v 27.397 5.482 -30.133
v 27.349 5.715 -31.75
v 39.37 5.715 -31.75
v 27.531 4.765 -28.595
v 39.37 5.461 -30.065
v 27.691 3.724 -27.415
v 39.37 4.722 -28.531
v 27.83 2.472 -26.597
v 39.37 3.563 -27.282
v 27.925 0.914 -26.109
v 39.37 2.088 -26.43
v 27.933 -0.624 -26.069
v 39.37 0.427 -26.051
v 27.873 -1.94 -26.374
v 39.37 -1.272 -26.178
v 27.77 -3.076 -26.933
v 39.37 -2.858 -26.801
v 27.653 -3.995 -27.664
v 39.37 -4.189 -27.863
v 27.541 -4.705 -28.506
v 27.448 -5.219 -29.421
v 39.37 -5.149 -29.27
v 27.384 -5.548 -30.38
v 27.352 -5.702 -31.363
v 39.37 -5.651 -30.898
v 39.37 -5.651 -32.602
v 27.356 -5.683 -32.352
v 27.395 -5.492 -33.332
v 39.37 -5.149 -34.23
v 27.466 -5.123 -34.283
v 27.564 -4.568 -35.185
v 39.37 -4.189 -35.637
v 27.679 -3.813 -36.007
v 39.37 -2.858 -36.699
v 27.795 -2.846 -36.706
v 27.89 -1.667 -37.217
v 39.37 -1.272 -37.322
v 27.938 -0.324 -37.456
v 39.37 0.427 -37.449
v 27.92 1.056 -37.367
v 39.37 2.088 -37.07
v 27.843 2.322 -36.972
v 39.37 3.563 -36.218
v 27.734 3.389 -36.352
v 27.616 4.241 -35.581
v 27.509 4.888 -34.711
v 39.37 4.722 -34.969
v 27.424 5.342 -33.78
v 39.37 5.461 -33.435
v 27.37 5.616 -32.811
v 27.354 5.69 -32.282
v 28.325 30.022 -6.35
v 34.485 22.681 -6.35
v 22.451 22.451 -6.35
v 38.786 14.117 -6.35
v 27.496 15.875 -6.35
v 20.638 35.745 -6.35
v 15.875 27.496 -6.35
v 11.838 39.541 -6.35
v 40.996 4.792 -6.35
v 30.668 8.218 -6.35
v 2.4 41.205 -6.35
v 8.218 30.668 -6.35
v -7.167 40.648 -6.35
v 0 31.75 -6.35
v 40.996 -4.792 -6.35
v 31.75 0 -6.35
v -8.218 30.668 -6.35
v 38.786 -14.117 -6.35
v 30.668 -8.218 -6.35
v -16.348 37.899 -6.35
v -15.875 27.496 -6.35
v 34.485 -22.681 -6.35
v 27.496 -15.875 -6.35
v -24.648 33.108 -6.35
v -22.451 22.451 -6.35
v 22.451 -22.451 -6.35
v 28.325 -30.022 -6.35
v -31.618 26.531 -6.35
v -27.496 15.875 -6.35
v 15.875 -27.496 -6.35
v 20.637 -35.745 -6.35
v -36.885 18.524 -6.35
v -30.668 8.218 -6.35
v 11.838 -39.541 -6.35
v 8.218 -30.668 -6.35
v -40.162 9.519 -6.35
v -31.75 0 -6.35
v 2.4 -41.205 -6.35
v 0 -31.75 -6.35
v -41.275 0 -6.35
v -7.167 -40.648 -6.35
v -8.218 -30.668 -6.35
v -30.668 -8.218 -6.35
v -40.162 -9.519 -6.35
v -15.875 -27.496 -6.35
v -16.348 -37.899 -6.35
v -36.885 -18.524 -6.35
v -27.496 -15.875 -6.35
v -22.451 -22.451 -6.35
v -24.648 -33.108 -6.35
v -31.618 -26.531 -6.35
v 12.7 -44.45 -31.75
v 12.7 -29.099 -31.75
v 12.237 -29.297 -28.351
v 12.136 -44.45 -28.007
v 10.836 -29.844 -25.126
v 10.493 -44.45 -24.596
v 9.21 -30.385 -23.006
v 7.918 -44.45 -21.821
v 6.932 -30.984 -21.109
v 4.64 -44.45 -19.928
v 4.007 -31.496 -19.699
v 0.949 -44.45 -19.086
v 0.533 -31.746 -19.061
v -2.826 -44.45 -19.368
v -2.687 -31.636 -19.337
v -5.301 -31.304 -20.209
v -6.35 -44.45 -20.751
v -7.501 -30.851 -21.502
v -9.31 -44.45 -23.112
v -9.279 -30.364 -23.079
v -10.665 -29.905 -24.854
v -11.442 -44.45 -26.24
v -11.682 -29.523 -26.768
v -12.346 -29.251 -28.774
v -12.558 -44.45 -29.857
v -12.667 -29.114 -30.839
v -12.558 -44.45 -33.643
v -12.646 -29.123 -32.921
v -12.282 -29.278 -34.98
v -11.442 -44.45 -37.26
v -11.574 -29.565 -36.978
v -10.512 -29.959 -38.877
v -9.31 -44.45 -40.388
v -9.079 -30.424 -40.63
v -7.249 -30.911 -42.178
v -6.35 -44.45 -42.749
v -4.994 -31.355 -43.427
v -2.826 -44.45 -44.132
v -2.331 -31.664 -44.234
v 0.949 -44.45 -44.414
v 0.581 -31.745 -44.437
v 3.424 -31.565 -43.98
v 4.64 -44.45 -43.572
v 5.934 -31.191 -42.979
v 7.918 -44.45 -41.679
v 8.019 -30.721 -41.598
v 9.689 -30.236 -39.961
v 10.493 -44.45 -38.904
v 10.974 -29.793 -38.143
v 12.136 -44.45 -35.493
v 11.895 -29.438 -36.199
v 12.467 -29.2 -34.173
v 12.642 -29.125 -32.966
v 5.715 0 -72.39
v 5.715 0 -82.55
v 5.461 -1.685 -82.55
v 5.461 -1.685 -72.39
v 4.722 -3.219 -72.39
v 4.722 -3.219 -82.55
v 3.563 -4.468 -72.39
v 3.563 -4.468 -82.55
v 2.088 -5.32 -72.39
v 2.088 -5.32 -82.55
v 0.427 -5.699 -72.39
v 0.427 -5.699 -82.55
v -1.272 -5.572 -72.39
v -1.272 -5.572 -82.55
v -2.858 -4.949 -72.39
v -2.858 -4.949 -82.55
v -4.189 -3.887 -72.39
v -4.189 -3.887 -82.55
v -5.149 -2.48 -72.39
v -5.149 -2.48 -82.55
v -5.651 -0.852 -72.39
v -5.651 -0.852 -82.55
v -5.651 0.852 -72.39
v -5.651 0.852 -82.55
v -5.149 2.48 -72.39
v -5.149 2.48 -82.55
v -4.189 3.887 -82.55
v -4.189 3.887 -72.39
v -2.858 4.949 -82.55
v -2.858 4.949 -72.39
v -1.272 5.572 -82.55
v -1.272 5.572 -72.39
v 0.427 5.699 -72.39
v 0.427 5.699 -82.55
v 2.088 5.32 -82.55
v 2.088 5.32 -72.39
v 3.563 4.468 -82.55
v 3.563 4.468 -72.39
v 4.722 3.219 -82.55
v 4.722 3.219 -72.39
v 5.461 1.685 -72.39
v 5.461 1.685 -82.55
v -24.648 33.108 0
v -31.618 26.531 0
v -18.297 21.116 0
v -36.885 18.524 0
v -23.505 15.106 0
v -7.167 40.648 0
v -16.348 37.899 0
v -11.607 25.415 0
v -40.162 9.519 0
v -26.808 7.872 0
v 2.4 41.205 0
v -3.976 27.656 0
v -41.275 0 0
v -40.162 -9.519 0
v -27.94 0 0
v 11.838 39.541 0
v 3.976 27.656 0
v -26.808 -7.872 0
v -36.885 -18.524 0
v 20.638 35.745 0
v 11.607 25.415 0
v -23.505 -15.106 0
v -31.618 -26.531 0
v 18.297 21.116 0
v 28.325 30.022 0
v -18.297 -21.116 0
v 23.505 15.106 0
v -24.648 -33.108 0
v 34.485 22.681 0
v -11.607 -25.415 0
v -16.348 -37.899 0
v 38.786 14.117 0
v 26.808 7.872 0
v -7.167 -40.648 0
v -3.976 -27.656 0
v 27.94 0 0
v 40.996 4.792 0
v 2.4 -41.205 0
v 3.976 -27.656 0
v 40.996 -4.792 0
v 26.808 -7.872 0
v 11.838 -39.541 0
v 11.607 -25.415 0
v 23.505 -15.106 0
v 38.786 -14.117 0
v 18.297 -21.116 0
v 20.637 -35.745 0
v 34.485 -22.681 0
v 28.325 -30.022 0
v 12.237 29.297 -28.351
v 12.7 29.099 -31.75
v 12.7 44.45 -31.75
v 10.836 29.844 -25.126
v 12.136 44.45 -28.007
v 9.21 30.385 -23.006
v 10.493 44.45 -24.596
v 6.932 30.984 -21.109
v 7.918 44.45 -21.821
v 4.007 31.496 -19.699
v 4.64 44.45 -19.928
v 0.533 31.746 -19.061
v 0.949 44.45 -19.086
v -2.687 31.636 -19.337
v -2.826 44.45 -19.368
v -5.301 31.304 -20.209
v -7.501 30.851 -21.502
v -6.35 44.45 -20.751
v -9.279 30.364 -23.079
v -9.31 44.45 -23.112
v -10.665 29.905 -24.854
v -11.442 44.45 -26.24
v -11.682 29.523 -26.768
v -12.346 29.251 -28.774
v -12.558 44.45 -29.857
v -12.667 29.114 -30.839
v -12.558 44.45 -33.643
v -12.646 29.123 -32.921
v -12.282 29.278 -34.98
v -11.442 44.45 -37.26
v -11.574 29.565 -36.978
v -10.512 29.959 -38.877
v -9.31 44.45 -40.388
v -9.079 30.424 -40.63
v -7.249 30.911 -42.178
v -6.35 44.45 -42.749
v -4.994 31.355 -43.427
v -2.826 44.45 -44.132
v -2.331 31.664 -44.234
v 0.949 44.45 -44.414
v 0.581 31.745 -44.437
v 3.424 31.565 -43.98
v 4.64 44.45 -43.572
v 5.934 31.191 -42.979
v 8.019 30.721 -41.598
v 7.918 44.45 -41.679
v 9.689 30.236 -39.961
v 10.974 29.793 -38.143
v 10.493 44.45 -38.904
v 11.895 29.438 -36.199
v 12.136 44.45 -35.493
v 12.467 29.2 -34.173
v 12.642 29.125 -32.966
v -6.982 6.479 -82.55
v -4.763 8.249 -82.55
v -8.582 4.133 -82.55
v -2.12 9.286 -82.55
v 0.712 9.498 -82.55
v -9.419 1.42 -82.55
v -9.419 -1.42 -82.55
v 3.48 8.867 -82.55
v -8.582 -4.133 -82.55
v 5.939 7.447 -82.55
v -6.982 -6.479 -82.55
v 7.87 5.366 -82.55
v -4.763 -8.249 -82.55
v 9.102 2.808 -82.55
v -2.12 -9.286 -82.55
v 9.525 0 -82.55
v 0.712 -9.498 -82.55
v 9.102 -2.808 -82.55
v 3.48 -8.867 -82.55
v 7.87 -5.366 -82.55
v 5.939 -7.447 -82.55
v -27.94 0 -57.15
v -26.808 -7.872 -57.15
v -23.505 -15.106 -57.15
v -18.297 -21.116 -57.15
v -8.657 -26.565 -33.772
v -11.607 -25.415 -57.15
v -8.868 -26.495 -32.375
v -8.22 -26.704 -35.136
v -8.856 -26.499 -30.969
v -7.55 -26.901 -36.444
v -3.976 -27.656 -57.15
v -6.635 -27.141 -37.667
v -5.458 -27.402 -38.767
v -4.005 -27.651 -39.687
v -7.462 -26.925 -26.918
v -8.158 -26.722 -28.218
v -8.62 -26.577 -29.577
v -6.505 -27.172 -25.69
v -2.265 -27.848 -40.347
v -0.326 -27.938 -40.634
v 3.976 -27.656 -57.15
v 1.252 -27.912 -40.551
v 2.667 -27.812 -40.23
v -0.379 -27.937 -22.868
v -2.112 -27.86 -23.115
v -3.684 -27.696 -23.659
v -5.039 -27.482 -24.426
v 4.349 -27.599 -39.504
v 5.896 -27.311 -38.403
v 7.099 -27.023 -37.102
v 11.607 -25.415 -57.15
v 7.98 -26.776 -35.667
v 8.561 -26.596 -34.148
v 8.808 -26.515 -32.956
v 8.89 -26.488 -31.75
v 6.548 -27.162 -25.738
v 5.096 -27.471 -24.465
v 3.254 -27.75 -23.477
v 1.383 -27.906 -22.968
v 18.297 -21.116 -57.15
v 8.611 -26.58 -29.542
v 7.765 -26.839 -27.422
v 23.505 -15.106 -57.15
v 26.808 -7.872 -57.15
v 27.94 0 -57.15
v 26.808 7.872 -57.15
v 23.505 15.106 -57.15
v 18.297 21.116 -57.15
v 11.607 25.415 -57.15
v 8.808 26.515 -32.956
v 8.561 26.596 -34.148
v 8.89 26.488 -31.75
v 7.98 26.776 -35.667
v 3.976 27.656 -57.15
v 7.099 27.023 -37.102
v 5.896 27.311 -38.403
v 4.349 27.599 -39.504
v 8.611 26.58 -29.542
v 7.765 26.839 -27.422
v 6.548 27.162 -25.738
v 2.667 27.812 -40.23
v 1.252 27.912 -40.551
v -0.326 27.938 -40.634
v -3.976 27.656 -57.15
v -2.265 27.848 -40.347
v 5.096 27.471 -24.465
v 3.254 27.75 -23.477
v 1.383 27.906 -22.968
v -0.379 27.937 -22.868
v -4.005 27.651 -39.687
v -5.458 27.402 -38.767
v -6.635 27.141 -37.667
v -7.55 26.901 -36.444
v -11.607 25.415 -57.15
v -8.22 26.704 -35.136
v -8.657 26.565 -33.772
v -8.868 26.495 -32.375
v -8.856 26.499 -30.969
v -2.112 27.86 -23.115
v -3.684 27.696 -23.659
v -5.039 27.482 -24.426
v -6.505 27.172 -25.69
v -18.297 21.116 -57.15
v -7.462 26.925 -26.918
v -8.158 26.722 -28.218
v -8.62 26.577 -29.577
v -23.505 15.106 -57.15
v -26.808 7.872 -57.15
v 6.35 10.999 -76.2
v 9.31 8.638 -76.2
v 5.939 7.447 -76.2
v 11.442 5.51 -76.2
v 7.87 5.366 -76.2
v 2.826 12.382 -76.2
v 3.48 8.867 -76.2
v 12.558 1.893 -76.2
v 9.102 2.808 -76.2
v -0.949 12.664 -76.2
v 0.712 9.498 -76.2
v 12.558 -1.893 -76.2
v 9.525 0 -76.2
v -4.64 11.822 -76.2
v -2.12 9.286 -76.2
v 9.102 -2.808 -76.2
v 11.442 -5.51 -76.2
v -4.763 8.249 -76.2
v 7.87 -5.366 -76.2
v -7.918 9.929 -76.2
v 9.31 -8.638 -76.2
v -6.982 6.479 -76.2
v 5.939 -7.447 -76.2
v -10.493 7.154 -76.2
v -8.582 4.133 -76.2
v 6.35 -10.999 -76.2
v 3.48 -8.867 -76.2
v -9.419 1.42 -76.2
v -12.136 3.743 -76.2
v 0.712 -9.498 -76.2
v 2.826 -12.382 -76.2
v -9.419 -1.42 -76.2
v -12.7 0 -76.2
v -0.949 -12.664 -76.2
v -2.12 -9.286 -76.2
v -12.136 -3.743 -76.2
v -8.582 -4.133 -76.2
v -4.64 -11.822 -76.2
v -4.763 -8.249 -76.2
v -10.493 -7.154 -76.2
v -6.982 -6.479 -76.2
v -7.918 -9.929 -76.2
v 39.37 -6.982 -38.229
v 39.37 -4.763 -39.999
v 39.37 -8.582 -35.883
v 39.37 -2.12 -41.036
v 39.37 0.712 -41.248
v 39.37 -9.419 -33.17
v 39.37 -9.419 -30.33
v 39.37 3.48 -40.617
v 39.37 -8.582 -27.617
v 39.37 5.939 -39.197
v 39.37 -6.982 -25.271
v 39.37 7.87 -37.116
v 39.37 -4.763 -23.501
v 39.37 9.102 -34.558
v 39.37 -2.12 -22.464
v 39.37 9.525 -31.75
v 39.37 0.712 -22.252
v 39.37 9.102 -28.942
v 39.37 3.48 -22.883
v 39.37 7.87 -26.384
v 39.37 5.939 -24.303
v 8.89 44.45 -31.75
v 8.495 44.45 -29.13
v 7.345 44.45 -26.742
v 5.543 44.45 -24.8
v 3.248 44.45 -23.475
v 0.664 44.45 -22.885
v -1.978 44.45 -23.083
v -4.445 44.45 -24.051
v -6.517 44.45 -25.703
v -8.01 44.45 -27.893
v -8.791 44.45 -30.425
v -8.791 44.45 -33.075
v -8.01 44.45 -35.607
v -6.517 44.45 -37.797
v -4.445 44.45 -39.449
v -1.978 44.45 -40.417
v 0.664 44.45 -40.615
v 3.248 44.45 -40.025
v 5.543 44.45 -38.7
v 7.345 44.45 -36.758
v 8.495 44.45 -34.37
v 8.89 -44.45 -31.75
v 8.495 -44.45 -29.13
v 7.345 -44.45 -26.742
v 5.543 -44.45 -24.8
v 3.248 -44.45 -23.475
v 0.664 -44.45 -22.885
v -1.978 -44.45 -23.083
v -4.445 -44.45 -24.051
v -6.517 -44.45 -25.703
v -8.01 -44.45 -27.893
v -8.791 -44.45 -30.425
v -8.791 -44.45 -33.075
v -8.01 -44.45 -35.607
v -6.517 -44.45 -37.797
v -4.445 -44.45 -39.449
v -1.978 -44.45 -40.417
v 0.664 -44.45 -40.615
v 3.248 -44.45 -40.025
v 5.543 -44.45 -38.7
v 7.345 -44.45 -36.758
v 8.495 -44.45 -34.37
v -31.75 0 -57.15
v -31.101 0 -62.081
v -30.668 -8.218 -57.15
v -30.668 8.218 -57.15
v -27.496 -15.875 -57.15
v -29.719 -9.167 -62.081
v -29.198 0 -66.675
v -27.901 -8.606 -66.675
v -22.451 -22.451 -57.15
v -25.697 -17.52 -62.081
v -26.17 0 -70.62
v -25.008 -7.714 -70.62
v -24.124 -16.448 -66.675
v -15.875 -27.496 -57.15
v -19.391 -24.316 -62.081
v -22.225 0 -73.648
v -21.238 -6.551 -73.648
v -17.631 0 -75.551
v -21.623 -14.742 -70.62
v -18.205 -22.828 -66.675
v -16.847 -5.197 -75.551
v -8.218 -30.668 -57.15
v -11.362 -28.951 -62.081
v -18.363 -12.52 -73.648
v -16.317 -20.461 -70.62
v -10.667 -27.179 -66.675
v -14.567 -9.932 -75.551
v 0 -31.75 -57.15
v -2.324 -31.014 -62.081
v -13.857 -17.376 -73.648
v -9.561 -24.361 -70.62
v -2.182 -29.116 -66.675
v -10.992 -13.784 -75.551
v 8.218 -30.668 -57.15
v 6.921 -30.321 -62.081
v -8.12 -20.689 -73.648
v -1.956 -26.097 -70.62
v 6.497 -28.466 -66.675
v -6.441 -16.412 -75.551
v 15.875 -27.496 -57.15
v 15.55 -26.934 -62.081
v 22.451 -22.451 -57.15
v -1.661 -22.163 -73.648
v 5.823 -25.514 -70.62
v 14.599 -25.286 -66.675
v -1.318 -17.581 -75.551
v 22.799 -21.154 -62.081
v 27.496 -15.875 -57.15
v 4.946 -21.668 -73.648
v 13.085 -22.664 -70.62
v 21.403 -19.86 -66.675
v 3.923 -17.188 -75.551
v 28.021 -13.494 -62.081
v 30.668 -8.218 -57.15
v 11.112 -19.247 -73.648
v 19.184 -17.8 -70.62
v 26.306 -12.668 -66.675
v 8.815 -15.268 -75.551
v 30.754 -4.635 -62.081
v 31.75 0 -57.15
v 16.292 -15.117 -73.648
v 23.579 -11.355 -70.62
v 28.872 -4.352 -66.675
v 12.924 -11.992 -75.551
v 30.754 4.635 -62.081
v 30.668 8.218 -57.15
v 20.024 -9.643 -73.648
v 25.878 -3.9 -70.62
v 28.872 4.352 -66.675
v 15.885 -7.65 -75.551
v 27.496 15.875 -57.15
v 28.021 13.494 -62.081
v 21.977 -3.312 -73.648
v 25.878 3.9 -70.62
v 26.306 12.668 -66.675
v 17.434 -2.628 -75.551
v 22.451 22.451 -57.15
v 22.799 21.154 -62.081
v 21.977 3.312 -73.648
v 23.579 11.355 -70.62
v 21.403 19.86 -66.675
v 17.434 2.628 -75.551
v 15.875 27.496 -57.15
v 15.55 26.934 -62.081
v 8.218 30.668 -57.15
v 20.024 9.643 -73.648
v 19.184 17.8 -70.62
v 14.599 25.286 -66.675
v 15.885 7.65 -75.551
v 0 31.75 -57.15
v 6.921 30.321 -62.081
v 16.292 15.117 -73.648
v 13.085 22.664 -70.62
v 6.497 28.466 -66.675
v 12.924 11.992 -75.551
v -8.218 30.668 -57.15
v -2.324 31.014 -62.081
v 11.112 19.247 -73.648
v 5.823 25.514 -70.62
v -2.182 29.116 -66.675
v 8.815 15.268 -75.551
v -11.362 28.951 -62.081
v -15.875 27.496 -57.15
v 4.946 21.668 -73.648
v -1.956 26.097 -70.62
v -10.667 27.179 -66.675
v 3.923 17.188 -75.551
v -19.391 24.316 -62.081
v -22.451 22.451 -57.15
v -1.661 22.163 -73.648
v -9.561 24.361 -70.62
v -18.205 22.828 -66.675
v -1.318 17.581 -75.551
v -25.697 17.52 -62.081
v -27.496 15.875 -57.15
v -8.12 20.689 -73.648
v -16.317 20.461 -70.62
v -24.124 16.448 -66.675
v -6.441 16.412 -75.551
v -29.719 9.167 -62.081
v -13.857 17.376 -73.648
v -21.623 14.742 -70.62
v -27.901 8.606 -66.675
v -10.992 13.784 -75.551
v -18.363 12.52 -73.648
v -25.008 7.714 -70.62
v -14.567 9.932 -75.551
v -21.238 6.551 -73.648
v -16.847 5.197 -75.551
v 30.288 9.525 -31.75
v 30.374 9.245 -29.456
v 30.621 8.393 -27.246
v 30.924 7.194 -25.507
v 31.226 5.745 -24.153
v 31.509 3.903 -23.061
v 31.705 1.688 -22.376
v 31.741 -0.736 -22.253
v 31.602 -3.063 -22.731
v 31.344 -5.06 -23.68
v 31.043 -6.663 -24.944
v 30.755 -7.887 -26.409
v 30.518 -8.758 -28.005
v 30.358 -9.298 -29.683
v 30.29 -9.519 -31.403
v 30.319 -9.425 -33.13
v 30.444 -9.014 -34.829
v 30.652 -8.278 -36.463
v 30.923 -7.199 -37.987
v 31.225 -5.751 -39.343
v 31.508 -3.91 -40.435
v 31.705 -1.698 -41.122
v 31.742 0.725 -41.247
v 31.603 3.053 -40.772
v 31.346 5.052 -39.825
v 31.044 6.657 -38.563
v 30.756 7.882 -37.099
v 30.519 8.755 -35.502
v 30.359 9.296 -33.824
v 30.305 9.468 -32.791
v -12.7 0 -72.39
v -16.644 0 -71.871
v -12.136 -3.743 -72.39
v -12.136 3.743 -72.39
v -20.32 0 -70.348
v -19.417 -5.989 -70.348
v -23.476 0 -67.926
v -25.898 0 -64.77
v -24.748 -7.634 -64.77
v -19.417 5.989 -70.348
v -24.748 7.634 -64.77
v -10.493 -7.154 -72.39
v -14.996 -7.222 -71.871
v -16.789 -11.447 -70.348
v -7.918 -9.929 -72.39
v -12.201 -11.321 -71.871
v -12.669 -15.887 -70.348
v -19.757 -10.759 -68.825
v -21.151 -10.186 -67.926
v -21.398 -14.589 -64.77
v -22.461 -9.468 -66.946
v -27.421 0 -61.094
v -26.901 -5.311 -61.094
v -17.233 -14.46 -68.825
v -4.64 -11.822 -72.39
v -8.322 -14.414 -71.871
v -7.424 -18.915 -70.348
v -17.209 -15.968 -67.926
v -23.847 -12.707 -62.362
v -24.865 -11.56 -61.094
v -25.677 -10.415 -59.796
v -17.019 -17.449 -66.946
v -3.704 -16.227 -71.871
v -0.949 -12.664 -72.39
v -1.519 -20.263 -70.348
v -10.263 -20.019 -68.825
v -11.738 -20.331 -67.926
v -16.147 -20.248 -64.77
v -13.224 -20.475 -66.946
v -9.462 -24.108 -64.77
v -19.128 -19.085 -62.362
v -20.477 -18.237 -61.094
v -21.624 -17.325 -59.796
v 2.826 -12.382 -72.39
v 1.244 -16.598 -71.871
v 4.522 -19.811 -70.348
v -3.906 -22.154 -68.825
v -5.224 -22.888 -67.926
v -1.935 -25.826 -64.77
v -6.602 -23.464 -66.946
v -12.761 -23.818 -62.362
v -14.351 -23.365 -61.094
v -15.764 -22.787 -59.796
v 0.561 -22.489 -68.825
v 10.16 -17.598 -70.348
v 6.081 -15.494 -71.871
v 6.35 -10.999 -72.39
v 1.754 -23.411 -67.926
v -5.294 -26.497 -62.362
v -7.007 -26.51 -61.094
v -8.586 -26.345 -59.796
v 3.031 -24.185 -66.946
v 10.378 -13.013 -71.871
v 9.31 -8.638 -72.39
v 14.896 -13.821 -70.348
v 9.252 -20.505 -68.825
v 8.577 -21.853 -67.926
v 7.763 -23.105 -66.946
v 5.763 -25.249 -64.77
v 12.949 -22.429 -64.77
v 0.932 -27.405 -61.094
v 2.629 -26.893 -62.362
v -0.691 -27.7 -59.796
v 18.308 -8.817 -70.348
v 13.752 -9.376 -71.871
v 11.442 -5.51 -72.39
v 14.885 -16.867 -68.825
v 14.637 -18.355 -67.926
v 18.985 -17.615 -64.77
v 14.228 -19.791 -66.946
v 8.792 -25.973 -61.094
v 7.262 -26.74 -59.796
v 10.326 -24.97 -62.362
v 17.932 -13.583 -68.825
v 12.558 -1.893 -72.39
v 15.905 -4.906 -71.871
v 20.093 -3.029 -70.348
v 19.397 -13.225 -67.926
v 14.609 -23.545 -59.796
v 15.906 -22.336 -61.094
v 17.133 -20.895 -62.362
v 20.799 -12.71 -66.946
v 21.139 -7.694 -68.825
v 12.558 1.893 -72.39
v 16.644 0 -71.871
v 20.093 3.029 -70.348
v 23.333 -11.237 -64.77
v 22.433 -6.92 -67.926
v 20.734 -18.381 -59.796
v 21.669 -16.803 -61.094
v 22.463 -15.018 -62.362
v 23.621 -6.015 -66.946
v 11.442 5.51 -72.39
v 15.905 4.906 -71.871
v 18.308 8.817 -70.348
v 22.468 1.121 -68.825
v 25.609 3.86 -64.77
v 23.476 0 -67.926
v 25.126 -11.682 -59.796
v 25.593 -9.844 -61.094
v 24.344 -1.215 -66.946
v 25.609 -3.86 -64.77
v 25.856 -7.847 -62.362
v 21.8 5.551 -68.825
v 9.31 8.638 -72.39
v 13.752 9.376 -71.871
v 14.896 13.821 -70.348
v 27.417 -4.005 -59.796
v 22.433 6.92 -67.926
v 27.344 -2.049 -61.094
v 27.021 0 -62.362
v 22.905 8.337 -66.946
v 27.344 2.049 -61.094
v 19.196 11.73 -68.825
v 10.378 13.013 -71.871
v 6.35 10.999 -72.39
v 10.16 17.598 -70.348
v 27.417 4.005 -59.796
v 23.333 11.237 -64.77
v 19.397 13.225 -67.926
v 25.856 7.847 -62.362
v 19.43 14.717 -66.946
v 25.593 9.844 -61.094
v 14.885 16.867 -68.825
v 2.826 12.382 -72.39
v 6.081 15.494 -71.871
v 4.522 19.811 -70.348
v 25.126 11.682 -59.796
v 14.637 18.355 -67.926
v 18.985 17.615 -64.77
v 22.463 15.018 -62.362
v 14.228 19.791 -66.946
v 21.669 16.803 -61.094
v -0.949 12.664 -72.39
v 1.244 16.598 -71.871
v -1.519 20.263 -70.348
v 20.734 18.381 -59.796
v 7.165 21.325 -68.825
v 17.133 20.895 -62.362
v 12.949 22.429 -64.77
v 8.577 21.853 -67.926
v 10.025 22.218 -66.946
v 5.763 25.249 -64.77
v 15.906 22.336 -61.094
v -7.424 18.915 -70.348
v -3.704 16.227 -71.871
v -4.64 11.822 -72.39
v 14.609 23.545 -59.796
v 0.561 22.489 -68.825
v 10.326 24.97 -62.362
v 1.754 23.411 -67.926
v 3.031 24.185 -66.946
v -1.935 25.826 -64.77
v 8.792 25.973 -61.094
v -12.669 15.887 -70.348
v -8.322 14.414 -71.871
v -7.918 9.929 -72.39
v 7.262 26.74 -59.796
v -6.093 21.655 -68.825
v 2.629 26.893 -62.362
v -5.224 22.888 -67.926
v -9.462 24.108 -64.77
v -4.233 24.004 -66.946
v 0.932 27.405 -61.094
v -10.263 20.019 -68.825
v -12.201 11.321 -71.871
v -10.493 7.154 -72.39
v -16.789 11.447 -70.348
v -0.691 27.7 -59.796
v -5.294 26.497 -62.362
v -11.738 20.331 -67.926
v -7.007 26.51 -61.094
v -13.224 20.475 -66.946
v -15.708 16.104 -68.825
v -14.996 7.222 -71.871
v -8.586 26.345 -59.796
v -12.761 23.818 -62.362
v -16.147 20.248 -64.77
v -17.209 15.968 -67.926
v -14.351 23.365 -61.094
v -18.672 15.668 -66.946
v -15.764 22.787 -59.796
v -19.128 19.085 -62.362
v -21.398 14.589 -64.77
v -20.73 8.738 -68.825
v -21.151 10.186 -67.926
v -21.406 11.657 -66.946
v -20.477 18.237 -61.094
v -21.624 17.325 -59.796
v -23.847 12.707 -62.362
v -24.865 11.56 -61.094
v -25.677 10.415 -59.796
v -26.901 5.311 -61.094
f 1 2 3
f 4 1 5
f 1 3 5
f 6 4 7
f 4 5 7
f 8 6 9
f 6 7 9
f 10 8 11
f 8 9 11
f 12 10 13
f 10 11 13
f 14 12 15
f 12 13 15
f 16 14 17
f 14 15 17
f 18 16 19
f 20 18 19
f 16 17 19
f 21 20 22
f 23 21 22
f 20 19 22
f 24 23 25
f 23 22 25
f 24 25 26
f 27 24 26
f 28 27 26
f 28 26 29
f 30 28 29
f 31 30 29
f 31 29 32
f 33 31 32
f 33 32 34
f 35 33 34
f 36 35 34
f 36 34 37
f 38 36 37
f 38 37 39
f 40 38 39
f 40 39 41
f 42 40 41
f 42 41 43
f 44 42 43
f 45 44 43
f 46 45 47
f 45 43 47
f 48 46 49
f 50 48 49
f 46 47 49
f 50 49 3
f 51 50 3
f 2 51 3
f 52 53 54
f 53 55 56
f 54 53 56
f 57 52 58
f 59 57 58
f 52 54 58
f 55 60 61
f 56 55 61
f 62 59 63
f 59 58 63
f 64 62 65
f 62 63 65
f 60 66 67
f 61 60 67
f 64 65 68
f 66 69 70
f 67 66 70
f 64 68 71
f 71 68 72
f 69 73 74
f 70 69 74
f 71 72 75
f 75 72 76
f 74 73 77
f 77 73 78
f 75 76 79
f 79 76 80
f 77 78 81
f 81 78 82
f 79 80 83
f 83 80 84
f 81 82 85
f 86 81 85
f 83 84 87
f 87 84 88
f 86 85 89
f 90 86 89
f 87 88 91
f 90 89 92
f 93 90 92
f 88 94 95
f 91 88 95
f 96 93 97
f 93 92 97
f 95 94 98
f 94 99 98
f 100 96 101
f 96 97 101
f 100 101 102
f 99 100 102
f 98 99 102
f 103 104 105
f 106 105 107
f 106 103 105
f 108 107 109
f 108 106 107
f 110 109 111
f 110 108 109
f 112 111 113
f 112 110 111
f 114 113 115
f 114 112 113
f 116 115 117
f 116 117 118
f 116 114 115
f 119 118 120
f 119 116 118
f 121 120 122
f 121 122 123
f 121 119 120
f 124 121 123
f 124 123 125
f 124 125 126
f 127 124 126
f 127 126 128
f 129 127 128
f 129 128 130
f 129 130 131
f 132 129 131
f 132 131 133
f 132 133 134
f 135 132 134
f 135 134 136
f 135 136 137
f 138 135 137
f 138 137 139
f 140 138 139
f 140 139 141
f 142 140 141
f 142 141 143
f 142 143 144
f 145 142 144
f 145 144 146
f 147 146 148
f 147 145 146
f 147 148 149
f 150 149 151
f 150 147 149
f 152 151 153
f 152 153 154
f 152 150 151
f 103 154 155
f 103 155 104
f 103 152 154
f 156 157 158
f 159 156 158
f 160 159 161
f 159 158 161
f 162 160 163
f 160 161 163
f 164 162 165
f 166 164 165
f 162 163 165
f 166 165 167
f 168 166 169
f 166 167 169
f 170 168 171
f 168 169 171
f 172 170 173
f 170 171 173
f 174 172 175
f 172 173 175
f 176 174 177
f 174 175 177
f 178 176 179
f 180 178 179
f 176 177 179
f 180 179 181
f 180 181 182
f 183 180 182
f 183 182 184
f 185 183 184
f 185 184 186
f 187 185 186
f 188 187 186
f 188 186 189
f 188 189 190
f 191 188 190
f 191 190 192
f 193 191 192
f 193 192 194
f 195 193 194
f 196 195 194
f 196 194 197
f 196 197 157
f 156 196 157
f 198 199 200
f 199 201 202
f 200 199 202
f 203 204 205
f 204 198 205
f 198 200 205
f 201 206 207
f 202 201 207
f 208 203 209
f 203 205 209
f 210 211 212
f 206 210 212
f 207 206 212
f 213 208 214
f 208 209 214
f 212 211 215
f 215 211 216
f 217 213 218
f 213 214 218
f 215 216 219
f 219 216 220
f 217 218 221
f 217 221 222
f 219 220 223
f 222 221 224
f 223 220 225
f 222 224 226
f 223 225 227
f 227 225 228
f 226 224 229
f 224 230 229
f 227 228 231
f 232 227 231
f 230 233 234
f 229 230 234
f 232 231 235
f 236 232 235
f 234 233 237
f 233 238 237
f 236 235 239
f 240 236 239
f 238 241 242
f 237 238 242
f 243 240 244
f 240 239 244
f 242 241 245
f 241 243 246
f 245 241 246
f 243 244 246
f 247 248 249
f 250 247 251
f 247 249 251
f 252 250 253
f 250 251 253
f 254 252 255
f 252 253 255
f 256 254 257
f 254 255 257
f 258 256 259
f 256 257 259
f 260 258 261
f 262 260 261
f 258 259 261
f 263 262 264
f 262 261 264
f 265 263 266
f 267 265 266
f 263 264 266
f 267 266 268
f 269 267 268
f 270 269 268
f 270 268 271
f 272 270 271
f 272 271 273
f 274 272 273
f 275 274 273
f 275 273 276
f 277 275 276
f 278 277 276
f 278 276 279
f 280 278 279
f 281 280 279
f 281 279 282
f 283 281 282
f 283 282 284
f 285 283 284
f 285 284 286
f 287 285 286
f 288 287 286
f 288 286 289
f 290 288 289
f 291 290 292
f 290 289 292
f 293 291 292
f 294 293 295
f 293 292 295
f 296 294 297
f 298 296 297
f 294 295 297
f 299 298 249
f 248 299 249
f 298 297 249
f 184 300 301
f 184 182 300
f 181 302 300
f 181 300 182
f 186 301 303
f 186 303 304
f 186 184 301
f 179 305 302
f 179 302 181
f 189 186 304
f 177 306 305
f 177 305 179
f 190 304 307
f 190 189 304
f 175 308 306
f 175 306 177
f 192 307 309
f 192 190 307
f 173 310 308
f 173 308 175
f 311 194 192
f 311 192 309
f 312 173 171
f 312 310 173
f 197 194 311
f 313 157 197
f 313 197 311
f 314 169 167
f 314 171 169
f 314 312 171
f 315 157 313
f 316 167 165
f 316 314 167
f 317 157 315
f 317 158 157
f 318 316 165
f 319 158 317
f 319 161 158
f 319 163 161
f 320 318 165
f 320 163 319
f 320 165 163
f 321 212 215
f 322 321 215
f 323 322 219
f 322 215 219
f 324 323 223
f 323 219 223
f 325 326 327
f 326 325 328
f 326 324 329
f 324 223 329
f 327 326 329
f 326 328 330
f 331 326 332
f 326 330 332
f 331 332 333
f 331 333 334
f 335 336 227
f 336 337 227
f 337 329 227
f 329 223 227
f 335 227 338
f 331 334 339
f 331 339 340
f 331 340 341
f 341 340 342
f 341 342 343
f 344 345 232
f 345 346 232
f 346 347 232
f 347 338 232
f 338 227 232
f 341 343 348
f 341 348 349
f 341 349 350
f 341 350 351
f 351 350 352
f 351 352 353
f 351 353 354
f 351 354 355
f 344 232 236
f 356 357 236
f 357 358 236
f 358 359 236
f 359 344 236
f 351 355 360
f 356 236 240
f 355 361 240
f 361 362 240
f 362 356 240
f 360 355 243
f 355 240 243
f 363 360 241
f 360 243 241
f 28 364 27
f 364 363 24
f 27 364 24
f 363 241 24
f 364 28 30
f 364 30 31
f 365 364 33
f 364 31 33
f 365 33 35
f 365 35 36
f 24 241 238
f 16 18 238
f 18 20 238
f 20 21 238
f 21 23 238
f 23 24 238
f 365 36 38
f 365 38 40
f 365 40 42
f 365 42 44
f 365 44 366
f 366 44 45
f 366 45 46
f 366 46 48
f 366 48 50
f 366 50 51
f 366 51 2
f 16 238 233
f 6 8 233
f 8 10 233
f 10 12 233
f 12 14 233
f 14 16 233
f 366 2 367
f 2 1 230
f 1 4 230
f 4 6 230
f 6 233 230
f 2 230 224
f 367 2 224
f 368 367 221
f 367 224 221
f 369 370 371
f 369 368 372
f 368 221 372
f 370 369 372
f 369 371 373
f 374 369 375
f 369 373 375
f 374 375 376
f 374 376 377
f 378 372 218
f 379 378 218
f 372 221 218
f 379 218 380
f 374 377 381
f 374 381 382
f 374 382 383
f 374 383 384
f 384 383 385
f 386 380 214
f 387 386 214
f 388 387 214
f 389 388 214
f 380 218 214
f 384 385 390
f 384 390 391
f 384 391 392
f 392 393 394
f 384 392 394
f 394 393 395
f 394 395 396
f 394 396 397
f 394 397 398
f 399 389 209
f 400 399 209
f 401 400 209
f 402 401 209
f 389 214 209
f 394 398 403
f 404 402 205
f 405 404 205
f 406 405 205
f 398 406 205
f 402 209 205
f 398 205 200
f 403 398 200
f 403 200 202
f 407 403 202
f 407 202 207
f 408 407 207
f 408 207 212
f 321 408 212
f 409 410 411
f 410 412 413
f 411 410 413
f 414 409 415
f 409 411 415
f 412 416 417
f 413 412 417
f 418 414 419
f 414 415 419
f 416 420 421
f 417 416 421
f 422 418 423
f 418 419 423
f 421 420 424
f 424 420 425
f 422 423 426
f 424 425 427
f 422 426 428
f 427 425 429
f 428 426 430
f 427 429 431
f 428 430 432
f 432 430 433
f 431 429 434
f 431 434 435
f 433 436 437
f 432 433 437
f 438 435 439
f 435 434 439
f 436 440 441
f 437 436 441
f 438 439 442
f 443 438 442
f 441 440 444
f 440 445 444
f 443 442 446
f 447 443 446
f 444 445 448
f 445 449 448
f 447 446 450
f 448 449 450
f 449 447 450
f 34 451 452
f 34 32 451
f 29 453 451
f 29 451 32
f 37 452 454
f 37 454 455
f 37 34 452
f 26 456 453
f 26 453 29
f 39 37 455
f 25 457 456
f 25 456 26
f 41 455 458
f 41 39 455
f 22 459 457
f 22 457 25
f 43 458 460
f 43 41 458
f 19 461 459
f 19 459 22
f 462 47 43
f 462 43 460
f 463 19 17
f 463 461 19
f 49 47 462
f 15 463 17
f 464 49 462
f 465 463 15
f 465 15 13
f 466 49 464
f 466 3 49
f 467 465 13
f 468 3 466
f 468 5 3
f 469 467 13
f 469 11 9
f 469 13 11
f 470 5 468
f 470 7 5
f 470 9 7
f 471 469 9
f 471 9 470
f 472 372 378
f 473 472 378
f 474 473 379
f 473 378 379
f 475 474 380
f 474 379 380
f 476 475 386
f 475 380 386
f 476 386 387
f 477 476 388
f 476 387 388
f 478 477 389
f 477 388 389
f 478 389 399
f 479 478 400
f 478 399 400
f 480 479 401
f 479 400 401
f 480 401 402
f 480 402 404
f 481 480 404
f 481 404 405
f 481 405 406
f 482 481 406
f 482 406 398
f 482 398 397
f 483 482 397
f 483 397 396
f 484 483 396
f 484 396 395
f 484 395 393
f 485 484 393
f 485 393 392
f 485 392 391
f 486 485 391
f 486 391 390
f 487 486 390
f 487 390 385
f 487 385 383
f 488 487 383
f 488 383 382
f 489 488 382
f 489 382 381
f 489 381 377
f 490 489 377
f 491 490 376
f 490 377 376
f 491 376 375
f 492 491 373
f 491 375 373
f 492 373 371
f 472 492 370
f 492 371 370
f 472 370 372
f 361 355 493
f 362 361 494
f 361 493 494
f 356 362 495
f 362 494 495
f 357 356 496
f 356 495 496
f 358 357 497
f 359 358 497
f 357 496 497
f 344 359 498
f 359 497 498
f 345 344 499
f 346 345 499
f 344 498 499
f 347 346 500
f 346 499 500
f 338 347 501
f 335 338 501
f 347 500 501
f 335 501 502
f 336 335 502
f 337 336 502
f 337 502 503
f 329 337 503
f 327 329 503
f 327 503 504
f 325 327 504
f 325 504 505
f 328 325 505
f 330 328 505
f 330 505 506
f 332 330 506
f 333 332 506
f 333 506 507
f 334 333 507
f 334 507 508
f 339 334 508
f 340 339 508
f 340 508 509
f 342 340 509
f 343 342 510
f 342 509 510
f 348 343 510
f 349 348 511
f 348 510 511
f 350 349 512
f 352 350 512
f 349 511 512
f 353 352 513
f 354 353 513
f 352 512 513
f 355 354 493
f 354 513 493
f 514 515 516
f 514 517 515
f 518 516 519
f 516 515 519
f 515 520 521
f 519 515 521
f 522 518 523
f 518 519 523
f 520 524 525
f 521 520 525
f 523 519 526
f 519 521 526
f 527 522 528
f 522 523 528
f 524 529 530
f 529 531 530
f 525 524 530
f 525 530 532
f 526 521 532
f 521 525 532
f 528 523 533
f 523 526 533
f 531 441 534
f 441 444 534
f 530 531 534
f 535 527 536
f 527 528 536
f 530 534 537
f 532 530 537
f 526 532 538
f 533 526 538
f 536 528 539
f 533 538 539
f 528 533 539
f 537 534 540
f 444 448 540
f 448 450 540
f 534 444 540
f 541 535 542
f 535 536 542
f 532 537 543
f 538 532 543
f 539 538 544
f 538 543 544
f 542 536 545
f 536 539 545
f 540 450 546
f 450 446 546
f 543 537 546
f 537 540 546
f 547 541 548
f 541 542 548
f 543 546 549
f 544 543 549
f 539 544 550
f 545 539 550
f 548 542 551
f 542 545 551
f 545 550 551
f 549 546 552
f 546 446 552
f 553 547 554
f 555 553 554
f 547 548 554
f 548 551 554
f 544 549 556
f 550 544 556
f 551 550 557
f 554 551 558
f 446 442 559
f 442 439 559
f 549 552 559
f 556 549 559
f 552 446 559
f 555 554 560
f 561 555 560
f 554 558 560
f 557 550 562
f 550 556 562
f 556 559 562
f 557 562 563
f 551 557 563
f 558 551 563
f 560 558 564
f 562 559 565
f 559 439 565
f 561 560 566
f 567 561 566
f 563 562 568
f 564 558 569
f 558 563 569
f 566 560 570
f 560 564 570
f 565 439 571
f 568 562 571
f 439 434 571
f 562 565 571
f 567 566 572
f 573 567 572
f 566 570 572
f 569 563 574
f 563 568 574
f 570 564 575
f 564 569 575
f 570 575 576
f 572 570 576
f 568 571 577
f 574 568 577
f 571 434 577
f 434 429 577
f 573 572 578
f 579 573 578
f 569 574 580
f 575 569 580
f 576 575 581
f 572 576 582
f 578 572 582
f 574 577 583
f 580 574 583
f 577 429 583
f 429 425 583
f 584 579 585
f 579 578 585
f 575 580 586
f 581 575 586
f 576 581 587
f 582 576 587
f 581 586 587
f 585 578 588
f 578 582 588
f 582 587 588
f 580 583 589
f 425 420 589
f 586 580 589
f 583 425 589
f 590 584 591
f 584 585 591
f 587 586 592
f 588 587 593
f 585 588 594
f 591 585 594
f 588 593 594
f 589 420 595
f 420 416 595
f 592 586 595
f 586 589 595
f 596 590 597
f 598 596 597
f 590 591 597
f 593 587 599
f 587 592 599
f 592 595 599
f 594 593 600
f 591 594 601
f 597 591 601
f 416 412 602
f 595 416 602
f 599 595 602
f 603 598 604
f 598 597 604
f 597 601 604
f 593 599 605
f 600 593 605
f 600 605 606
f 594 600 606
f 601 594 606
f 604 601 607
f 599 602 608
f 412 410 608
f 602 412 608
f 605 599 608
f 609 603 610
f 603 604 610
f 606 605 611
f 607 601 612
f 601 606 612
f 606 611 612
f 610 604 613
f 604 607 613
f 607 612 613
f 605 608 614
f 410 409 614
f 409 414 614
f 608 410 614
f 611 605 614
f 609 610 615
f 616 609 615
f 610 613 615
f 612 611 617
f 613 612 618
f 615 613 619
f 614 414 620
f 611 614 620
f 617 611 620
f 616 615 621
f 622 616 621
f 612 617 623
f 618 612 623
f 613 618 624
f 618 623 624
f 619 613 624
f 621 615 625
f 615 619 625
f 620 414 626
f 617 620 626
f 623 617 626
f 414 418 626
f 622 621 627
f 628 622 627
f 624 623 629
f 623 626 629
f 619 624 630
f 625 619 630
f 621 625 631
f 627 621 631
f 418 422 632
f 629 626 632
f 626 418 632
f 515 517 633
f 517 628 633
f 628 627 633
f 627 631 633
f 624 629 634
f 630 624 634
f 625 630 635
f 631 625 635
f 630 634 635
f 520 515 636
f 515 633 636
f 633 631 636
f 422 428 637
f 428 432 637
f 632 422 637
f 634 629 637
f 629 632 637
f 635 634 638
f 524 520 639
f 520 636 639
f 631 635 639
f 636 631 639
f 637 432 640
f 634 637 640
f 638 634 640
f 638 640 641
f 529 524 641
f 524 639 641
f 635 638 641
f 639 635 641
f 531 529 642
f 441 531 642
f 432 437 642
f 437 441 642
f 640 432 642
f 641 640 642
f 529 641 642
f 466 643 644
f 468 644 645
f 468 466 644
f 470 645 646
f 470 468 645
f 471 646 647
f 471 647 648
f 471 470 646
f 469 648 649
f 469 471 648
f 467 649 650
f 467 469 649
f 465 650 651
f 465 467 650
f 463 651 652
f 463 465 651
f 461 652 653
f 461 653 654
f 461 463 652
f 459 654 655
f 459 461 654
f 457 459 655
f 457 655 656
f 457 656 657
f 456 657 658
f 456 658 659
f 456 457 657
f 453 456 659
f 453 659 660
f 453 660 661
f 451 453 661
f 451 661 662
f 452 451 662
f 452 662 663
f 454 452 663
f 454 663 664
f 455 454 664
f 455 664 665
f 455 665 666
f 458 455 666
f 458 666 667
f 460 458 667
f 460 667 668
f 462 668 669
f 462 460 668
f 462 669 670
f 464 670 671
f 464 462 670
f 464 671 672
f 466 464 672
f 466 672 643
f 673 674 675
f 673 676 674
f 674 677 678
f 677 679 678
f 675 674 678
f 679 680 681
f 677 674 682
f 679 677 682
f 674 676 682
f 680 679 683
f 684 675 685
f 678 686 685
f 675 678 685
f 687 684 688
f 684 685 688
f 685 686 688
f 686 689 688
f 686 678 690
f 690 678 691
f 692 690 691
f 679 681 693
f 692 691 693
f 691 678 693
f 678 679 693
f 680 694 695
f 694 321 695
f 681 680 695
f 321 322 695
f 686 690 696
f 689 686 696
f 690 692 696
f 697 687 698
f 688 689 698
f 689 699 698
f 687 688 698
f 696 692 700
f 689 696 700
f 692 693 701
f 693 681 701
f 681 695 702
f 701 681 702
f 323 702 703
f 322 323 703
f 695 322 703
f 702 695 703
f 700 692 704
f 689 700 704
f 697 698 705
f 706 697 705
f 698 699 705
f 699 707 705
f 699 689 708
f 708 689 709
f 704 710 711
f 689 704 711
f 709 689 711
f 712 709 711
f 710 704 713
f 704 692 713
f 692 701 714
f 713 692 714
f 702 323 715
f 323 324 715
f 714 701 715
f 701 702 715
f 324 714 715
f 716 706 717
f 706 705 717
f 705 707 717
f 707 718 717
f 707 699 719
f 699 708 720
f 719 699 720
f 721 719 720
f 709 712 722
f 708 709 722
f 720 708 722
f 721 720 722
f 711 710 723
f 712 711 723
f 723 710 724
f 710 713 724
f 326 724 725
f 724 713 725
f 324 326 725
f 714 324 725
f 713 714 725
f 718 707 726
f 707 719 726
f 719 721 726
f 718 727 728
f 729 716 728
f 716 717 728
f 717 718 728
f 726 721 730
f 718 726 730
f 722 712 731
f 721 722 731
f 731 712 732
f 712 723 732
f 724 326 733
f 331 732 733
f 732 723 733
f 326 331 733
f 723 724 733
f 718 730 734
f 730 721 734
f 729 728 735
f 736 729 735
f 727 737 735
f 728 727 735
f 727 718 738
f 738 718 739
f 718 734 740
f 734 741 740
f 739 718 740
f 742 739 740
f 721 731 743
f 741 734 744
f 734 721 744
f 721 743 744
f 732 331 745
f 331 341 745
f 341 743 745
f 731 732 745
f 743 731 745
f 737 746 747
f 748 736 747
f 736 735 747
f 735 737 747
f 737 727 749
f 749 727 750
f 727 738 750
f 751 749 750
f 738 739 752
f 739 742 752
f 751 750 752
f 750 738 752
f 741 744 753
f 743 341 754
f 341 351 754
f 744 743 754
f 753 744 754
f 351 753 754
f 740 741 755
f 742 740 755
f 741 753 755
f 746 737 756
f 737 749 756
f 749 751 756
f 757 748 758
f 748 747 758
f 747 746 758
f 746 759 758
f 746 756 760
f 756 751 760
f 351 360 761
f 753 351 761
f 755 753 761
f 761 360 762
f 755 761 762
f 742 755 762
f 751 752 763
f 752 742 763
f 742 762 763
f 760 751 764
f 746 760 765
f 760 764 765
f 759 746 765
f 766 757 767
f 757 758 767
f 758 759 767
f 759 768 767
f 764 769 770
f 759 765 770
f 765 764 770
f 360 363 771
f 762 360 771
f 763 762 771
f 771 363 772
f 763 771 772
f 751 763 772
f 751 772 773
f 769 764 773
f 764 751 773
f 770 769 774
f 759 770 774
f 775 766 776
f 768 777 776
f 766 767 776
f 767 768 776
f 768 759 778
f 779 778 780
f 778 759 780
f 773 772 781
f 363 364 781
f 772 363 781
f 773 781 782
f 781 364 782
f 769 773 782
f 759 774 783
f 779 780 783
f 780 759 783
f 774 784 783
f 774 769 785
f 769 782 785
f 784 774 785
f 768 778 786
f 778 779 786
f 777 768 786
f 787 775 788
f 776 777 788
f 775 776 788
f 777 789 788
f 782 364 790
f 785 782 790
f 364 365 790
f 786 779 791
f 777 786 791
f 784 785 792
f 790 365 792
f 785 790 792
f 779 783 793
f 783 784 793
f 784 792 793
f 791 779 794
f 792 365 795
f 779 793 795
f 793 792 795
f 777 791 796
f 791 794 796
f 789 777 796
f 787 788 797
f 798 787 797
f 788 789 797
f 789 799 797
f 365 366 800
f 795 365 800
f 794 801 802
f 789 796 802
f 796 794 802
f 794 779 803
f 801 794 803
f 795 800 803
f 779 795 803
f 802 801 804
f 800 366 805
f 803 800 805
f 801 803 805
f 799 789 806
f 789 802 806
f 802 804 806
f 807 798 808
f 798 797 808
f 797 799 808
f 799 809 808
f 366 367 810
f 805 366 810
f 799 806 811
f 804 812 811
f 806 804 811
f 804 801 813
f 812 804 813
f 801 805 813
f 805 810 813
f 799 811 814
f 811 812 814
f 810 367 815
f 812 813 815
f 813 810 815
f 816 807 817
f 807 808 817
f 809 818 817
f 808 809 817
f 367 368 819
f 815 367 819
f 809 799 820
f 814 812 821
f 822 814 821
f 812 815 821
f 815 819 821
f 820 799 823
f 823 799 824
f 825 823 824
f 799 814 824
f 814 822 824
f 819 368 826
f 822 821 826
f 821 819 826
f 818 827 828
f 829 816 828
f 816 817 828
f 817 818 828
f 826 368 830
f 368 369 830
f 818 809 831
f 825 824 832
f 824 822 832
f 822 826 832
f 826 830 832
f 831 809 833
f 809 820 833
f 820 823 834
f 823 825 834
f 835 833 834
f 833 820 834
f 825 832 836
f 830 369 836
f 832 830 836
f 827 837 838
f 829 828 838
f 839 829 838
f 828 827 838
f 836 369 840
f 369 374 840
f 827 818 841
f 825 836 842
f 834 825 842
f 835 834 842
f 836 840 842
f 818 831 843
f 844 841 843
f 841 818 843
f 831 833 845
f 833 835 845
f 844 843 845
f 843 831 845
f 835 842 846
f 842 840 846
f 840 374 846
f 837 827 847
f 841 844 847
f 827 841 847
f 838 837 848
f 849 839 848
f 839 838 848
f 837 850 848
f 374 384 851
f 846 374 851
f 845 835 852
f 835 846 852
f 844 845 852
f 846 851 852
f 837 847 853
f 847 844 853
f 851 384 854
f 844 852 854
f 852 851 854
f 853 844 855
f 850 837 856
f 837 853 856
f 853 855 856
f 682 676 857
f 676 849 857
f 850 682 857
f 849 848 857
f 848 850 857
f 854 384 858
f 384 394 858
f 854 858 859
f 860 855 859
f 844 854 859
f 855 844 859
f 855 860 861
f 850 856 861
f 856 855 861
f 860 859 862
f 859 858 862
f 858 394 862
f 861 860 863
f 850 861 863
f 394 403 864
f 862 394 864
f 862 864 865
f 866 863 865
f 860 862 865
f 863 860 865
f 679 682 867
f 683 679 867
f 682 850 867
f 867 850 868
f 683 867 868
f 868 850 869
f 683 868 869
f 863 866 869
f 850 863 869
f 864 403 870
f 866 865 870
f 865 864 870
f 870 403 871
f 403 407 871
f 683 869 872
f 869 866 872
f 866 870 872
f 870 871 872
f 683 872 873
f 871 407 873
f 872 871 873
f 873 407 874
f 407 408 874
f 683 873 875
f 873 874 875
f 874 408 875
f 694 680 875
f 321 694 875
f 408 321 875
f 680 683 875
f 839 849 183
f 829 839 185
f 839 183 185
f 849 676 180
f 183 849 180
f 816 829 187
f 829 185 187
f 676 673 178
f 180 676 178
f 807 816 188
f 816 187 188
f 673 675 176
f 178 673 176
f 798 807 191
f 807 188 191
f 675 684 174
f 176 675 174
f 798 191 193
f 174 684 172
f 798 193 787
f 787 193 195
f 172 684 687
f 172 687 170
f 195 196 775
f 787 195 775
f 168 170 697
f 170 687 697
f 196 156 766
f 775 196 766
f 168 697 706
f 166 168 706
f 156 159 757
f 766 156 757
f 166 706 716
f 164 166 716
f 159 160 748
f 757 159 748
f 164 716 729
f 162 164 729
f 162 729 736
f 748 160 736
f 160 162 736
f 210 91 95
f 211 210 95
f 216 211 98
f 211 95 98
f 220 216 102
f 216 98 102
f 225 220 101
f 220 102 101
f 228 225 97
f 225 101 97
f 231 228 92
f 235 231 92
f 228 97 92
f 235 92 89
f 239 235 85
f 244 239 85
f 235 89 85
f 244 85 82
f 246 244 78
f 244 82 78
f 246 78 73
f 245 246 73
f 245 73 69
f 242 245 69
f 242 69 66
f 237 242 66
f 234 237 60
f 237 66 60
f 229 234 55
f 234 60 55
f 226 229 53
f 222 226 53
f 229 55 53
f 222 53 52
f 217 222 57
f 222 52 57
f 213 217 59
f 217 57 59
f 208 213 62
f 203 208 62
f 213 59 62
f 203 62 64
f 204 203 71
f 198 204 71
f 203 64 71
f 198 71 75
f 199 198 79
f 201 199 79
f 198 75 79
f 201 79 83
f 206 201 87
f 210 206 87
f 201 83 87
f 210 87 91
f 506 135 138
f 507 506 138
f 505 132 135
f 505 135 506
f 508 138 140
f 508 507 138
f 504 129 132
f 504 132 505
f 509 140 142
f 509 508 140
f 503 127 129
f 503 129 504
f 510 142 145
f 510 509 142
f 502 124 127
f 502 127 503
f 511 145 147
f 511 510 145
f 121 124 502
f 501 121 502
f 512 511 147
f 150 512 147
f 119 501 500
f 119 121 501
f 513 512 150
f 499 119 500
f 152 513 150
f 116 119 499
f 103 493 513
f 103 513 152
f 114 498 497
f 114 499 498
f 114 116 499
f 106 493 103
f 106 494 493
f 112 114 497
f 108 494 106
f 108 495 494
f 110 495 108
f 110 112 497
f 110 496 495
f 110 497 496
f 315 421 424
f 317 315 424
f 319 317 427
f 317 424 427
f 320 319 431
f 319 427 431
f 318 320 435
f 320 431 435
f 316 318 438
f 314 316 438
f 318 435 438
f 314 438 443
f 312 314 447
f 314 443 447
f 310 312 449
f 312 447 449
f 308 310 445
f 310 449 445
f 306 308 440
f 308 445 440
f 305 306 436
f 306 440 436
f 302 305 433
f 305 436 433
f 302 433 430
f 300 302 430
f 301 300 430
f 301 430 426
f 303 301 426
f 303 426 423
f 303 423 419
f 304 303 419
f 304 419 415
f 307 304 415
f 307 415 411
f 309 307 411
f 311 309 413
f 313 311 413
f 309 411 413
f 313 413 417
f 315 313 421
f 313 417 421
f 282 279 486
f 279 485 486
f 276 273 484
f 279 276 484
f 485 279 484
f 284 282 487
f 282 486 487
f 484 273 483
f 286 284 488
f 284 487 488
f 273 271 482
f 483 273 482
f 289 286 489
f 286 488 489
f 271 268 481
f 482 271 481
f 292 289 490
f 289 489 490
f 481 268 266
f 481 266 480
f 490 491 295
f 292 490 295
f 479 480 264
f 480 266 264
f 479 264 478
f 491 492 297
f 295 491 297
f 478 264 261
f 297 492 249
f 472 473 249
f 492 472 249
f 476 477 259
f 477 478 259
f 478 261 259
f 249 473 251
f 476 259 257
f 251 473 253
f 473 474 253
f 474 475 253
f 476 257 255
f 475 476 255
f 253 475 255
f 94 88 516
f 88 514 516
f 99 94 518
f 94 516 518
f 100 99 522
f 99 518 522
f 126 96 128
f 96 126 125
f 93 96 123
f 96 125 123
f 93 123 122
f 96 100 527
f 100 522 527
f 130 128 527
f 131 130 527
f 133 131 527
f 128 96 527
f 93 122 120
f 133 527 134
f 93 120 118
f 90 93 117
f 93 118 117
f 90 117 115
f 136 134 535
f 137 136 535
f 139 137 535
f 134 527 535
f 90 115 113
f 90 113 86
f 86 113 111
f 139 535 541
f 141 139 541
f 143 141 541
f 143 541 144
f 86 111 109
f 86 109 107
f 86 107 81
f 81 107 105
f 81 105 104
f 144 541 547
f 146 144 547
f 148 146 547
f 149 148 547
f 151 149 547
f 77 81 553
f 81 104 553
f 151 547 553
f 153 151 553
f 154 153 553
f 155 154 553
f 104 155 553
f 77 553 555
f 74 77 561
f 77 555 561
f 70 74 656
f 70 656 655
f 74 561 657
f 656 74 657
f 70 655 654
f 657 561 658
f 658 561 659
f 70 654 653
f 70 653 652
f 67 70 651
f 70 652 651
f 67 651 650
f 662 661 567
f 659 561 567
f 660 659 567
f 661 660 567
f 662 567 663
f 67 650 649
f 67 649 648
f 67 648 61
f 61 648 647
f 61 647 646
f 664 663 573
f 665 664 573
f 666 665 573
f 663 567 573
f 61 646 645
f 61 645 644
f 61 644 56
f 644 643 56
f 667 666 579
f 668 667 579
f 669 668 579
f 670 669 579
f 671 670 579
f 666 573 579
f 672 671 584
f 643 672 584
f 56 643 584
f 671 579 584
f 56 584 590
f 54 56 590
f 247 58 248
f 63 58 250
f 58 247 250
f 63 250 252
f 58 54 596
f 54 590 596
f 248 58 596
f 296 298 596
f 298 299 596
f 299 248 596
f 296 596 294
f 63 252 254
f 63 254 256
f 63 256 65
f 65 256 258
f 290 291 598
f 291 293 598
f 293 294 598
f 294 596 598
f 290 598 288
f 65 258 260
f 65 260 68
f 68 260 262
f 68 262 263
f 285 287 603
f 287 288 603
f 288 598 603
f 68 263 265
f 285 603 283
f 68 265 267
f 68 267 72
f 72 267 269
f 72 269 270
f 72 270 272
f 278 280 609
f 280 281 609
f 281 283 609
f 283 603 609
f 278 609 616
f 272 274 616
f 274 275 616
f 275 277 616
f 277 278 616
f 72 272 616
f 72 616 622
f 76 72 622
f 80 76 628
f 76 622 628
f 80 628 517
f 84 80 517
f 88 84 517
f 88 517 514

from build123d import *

# Parameters (mm, degrees)
F3_R      = 9.525
F4_DEPTH  = 6.35
F6_R      = 12.7
F8_R      = 8.89
F9_DEPTH  = 101.6
F10_R     = 5.715
F11_DEPTH = 25.4
F13_R     = 9.525
F15_R     = 5.715
F16_DEPTH = 25.4


# Not quite as in the source:
# - a pattern or mirror of a feature is missing from the dataset's text; its kind, count and spacing are read off the source's solid


with BuildPart() as f1:
    # F0 (on Front) → F1 (revolve)
    with BuildSketch(Plane.XZ):
        with BuildLine():
            Line((-27.94, 0), (-41.275, 0))
            Line((-41.275, 0), (-41.275, -6.35))
            Line((-41.275, -6.35), (-31.75, -6.35))
            Line((-31.75, -6.35), (-31.75, -57.15))
            ThreePointArc((-31.75, -57.15), (-26.1703841816, -70.6203841816), (-12.7, -76.2))
            Line((-12.7, -76.2), (0, -76.2))
            Line((0, -76.2), (0, -72.39))
            Line((0, -72.39), (-12.7, -72.39))
            ThreePointArc((-12.7, -72.39), (-23.4763073453, -67.9263073453), (-27.94, -57.15))
            Line((-27.94, -57.15), (-27.94, 0))
        make_face()
    revolve(axis=Axis((0, 0, -38.1), (0, 0, 1)))



with BuildPart() as f2:
    # F0 (on Front) → F2 (revolve)
    with BuildSketch(Plane.XZ):
        with BuildLine():
            Line((-27.94, 0), (-41.275, 0))
            Line((-41.275, 0), (-41.275, -6.35))
            Line((-41.275, -6.35), (-31.75, -6.35))
            Line((-31.75, -6.35), (-31.75, -57.15))
            ThreePointArc((-31.75, -57.15), (-26.1703841816, -70.6203841816), (-12.7, -76.2))
            Line((-12.7, -76.2), (0, -76.2))
            Line((0, -76.2), (0, -72.39))
            Line((0, -72.39), (-12.7, -72.39))
            ThreePointArc((-12.7, -72.39), (-23.4763073453, -67.9263073453), (-27.94, -57.15))
            Line((-27.94, -57.15), (-27.94, 0))
        make_face()
    revolve(axis=Axis((0, 0, -38.1), (0, 0, 1)))


with BuildPart() as f1_1:
    add(f1.part)

    add(f2.part)  # F4 merges F2
    # F3 (on face) → F4 (join)
    with BuildSketch(Plane(origin=(0, 0, -76.2), x_dir=(1, 0, 0), z_dir=(0, 0, -1))):
        Circle(F3_R)
    extrude(amount=F4_DEPTH)

    # F6 (on offset) → F7 (join, up to the next surface of F1)
    with BuildSketch(Plane.XZ.offset(44.45)):
        with Locations((0, -31.75)):
            Circle(F6_R)
    f7 = extrude(until=Until.NEXT, dir=(0, 1, 0))

    # F7_copies: F7 across plane
    add(f7.mirror(Plane.ZX))

    # F8 (on face) → F9 (cut)
    with BuildSketch(Plane.XZ.offset(44.45)):
        with Locations((0, -31.75)):
            Circle(F8_R)
    extrude(amount=-F9_DEPTH, mode=Mode.SUBTRACT)

    # F10 (on face) → F11 (cut)
    with BuildSketch(Plane(origin=(0, 0, -82.55), x_dir=(1, 0, 0), z_dir=(0, 0, -1))):
        Circle(F10_R)
    extrude(amount=-F11_DEPTH, mode=Mode.SUBTRACT)

    # F13 (on offset) → F14 (join, up to the next surface of F1)
    with BuildSketch(Plane.YZ.offset(39.37)):
        with Locations((0, -31.75)):
            Circle(F13_R)
    extrude(until=Until.NEXT, dir=(-1, 0, 0))

    # F15 (on face) → F16 (cut)
    with BuildSketch(Plane.YZ.offset(39.37)):
        with Locations((0, -31.75)):
            Circle(F15_R)
    extrude(amount=-F16_DEPTH, mode=Mode.SUBTRACT)


solid = f1_1.part
